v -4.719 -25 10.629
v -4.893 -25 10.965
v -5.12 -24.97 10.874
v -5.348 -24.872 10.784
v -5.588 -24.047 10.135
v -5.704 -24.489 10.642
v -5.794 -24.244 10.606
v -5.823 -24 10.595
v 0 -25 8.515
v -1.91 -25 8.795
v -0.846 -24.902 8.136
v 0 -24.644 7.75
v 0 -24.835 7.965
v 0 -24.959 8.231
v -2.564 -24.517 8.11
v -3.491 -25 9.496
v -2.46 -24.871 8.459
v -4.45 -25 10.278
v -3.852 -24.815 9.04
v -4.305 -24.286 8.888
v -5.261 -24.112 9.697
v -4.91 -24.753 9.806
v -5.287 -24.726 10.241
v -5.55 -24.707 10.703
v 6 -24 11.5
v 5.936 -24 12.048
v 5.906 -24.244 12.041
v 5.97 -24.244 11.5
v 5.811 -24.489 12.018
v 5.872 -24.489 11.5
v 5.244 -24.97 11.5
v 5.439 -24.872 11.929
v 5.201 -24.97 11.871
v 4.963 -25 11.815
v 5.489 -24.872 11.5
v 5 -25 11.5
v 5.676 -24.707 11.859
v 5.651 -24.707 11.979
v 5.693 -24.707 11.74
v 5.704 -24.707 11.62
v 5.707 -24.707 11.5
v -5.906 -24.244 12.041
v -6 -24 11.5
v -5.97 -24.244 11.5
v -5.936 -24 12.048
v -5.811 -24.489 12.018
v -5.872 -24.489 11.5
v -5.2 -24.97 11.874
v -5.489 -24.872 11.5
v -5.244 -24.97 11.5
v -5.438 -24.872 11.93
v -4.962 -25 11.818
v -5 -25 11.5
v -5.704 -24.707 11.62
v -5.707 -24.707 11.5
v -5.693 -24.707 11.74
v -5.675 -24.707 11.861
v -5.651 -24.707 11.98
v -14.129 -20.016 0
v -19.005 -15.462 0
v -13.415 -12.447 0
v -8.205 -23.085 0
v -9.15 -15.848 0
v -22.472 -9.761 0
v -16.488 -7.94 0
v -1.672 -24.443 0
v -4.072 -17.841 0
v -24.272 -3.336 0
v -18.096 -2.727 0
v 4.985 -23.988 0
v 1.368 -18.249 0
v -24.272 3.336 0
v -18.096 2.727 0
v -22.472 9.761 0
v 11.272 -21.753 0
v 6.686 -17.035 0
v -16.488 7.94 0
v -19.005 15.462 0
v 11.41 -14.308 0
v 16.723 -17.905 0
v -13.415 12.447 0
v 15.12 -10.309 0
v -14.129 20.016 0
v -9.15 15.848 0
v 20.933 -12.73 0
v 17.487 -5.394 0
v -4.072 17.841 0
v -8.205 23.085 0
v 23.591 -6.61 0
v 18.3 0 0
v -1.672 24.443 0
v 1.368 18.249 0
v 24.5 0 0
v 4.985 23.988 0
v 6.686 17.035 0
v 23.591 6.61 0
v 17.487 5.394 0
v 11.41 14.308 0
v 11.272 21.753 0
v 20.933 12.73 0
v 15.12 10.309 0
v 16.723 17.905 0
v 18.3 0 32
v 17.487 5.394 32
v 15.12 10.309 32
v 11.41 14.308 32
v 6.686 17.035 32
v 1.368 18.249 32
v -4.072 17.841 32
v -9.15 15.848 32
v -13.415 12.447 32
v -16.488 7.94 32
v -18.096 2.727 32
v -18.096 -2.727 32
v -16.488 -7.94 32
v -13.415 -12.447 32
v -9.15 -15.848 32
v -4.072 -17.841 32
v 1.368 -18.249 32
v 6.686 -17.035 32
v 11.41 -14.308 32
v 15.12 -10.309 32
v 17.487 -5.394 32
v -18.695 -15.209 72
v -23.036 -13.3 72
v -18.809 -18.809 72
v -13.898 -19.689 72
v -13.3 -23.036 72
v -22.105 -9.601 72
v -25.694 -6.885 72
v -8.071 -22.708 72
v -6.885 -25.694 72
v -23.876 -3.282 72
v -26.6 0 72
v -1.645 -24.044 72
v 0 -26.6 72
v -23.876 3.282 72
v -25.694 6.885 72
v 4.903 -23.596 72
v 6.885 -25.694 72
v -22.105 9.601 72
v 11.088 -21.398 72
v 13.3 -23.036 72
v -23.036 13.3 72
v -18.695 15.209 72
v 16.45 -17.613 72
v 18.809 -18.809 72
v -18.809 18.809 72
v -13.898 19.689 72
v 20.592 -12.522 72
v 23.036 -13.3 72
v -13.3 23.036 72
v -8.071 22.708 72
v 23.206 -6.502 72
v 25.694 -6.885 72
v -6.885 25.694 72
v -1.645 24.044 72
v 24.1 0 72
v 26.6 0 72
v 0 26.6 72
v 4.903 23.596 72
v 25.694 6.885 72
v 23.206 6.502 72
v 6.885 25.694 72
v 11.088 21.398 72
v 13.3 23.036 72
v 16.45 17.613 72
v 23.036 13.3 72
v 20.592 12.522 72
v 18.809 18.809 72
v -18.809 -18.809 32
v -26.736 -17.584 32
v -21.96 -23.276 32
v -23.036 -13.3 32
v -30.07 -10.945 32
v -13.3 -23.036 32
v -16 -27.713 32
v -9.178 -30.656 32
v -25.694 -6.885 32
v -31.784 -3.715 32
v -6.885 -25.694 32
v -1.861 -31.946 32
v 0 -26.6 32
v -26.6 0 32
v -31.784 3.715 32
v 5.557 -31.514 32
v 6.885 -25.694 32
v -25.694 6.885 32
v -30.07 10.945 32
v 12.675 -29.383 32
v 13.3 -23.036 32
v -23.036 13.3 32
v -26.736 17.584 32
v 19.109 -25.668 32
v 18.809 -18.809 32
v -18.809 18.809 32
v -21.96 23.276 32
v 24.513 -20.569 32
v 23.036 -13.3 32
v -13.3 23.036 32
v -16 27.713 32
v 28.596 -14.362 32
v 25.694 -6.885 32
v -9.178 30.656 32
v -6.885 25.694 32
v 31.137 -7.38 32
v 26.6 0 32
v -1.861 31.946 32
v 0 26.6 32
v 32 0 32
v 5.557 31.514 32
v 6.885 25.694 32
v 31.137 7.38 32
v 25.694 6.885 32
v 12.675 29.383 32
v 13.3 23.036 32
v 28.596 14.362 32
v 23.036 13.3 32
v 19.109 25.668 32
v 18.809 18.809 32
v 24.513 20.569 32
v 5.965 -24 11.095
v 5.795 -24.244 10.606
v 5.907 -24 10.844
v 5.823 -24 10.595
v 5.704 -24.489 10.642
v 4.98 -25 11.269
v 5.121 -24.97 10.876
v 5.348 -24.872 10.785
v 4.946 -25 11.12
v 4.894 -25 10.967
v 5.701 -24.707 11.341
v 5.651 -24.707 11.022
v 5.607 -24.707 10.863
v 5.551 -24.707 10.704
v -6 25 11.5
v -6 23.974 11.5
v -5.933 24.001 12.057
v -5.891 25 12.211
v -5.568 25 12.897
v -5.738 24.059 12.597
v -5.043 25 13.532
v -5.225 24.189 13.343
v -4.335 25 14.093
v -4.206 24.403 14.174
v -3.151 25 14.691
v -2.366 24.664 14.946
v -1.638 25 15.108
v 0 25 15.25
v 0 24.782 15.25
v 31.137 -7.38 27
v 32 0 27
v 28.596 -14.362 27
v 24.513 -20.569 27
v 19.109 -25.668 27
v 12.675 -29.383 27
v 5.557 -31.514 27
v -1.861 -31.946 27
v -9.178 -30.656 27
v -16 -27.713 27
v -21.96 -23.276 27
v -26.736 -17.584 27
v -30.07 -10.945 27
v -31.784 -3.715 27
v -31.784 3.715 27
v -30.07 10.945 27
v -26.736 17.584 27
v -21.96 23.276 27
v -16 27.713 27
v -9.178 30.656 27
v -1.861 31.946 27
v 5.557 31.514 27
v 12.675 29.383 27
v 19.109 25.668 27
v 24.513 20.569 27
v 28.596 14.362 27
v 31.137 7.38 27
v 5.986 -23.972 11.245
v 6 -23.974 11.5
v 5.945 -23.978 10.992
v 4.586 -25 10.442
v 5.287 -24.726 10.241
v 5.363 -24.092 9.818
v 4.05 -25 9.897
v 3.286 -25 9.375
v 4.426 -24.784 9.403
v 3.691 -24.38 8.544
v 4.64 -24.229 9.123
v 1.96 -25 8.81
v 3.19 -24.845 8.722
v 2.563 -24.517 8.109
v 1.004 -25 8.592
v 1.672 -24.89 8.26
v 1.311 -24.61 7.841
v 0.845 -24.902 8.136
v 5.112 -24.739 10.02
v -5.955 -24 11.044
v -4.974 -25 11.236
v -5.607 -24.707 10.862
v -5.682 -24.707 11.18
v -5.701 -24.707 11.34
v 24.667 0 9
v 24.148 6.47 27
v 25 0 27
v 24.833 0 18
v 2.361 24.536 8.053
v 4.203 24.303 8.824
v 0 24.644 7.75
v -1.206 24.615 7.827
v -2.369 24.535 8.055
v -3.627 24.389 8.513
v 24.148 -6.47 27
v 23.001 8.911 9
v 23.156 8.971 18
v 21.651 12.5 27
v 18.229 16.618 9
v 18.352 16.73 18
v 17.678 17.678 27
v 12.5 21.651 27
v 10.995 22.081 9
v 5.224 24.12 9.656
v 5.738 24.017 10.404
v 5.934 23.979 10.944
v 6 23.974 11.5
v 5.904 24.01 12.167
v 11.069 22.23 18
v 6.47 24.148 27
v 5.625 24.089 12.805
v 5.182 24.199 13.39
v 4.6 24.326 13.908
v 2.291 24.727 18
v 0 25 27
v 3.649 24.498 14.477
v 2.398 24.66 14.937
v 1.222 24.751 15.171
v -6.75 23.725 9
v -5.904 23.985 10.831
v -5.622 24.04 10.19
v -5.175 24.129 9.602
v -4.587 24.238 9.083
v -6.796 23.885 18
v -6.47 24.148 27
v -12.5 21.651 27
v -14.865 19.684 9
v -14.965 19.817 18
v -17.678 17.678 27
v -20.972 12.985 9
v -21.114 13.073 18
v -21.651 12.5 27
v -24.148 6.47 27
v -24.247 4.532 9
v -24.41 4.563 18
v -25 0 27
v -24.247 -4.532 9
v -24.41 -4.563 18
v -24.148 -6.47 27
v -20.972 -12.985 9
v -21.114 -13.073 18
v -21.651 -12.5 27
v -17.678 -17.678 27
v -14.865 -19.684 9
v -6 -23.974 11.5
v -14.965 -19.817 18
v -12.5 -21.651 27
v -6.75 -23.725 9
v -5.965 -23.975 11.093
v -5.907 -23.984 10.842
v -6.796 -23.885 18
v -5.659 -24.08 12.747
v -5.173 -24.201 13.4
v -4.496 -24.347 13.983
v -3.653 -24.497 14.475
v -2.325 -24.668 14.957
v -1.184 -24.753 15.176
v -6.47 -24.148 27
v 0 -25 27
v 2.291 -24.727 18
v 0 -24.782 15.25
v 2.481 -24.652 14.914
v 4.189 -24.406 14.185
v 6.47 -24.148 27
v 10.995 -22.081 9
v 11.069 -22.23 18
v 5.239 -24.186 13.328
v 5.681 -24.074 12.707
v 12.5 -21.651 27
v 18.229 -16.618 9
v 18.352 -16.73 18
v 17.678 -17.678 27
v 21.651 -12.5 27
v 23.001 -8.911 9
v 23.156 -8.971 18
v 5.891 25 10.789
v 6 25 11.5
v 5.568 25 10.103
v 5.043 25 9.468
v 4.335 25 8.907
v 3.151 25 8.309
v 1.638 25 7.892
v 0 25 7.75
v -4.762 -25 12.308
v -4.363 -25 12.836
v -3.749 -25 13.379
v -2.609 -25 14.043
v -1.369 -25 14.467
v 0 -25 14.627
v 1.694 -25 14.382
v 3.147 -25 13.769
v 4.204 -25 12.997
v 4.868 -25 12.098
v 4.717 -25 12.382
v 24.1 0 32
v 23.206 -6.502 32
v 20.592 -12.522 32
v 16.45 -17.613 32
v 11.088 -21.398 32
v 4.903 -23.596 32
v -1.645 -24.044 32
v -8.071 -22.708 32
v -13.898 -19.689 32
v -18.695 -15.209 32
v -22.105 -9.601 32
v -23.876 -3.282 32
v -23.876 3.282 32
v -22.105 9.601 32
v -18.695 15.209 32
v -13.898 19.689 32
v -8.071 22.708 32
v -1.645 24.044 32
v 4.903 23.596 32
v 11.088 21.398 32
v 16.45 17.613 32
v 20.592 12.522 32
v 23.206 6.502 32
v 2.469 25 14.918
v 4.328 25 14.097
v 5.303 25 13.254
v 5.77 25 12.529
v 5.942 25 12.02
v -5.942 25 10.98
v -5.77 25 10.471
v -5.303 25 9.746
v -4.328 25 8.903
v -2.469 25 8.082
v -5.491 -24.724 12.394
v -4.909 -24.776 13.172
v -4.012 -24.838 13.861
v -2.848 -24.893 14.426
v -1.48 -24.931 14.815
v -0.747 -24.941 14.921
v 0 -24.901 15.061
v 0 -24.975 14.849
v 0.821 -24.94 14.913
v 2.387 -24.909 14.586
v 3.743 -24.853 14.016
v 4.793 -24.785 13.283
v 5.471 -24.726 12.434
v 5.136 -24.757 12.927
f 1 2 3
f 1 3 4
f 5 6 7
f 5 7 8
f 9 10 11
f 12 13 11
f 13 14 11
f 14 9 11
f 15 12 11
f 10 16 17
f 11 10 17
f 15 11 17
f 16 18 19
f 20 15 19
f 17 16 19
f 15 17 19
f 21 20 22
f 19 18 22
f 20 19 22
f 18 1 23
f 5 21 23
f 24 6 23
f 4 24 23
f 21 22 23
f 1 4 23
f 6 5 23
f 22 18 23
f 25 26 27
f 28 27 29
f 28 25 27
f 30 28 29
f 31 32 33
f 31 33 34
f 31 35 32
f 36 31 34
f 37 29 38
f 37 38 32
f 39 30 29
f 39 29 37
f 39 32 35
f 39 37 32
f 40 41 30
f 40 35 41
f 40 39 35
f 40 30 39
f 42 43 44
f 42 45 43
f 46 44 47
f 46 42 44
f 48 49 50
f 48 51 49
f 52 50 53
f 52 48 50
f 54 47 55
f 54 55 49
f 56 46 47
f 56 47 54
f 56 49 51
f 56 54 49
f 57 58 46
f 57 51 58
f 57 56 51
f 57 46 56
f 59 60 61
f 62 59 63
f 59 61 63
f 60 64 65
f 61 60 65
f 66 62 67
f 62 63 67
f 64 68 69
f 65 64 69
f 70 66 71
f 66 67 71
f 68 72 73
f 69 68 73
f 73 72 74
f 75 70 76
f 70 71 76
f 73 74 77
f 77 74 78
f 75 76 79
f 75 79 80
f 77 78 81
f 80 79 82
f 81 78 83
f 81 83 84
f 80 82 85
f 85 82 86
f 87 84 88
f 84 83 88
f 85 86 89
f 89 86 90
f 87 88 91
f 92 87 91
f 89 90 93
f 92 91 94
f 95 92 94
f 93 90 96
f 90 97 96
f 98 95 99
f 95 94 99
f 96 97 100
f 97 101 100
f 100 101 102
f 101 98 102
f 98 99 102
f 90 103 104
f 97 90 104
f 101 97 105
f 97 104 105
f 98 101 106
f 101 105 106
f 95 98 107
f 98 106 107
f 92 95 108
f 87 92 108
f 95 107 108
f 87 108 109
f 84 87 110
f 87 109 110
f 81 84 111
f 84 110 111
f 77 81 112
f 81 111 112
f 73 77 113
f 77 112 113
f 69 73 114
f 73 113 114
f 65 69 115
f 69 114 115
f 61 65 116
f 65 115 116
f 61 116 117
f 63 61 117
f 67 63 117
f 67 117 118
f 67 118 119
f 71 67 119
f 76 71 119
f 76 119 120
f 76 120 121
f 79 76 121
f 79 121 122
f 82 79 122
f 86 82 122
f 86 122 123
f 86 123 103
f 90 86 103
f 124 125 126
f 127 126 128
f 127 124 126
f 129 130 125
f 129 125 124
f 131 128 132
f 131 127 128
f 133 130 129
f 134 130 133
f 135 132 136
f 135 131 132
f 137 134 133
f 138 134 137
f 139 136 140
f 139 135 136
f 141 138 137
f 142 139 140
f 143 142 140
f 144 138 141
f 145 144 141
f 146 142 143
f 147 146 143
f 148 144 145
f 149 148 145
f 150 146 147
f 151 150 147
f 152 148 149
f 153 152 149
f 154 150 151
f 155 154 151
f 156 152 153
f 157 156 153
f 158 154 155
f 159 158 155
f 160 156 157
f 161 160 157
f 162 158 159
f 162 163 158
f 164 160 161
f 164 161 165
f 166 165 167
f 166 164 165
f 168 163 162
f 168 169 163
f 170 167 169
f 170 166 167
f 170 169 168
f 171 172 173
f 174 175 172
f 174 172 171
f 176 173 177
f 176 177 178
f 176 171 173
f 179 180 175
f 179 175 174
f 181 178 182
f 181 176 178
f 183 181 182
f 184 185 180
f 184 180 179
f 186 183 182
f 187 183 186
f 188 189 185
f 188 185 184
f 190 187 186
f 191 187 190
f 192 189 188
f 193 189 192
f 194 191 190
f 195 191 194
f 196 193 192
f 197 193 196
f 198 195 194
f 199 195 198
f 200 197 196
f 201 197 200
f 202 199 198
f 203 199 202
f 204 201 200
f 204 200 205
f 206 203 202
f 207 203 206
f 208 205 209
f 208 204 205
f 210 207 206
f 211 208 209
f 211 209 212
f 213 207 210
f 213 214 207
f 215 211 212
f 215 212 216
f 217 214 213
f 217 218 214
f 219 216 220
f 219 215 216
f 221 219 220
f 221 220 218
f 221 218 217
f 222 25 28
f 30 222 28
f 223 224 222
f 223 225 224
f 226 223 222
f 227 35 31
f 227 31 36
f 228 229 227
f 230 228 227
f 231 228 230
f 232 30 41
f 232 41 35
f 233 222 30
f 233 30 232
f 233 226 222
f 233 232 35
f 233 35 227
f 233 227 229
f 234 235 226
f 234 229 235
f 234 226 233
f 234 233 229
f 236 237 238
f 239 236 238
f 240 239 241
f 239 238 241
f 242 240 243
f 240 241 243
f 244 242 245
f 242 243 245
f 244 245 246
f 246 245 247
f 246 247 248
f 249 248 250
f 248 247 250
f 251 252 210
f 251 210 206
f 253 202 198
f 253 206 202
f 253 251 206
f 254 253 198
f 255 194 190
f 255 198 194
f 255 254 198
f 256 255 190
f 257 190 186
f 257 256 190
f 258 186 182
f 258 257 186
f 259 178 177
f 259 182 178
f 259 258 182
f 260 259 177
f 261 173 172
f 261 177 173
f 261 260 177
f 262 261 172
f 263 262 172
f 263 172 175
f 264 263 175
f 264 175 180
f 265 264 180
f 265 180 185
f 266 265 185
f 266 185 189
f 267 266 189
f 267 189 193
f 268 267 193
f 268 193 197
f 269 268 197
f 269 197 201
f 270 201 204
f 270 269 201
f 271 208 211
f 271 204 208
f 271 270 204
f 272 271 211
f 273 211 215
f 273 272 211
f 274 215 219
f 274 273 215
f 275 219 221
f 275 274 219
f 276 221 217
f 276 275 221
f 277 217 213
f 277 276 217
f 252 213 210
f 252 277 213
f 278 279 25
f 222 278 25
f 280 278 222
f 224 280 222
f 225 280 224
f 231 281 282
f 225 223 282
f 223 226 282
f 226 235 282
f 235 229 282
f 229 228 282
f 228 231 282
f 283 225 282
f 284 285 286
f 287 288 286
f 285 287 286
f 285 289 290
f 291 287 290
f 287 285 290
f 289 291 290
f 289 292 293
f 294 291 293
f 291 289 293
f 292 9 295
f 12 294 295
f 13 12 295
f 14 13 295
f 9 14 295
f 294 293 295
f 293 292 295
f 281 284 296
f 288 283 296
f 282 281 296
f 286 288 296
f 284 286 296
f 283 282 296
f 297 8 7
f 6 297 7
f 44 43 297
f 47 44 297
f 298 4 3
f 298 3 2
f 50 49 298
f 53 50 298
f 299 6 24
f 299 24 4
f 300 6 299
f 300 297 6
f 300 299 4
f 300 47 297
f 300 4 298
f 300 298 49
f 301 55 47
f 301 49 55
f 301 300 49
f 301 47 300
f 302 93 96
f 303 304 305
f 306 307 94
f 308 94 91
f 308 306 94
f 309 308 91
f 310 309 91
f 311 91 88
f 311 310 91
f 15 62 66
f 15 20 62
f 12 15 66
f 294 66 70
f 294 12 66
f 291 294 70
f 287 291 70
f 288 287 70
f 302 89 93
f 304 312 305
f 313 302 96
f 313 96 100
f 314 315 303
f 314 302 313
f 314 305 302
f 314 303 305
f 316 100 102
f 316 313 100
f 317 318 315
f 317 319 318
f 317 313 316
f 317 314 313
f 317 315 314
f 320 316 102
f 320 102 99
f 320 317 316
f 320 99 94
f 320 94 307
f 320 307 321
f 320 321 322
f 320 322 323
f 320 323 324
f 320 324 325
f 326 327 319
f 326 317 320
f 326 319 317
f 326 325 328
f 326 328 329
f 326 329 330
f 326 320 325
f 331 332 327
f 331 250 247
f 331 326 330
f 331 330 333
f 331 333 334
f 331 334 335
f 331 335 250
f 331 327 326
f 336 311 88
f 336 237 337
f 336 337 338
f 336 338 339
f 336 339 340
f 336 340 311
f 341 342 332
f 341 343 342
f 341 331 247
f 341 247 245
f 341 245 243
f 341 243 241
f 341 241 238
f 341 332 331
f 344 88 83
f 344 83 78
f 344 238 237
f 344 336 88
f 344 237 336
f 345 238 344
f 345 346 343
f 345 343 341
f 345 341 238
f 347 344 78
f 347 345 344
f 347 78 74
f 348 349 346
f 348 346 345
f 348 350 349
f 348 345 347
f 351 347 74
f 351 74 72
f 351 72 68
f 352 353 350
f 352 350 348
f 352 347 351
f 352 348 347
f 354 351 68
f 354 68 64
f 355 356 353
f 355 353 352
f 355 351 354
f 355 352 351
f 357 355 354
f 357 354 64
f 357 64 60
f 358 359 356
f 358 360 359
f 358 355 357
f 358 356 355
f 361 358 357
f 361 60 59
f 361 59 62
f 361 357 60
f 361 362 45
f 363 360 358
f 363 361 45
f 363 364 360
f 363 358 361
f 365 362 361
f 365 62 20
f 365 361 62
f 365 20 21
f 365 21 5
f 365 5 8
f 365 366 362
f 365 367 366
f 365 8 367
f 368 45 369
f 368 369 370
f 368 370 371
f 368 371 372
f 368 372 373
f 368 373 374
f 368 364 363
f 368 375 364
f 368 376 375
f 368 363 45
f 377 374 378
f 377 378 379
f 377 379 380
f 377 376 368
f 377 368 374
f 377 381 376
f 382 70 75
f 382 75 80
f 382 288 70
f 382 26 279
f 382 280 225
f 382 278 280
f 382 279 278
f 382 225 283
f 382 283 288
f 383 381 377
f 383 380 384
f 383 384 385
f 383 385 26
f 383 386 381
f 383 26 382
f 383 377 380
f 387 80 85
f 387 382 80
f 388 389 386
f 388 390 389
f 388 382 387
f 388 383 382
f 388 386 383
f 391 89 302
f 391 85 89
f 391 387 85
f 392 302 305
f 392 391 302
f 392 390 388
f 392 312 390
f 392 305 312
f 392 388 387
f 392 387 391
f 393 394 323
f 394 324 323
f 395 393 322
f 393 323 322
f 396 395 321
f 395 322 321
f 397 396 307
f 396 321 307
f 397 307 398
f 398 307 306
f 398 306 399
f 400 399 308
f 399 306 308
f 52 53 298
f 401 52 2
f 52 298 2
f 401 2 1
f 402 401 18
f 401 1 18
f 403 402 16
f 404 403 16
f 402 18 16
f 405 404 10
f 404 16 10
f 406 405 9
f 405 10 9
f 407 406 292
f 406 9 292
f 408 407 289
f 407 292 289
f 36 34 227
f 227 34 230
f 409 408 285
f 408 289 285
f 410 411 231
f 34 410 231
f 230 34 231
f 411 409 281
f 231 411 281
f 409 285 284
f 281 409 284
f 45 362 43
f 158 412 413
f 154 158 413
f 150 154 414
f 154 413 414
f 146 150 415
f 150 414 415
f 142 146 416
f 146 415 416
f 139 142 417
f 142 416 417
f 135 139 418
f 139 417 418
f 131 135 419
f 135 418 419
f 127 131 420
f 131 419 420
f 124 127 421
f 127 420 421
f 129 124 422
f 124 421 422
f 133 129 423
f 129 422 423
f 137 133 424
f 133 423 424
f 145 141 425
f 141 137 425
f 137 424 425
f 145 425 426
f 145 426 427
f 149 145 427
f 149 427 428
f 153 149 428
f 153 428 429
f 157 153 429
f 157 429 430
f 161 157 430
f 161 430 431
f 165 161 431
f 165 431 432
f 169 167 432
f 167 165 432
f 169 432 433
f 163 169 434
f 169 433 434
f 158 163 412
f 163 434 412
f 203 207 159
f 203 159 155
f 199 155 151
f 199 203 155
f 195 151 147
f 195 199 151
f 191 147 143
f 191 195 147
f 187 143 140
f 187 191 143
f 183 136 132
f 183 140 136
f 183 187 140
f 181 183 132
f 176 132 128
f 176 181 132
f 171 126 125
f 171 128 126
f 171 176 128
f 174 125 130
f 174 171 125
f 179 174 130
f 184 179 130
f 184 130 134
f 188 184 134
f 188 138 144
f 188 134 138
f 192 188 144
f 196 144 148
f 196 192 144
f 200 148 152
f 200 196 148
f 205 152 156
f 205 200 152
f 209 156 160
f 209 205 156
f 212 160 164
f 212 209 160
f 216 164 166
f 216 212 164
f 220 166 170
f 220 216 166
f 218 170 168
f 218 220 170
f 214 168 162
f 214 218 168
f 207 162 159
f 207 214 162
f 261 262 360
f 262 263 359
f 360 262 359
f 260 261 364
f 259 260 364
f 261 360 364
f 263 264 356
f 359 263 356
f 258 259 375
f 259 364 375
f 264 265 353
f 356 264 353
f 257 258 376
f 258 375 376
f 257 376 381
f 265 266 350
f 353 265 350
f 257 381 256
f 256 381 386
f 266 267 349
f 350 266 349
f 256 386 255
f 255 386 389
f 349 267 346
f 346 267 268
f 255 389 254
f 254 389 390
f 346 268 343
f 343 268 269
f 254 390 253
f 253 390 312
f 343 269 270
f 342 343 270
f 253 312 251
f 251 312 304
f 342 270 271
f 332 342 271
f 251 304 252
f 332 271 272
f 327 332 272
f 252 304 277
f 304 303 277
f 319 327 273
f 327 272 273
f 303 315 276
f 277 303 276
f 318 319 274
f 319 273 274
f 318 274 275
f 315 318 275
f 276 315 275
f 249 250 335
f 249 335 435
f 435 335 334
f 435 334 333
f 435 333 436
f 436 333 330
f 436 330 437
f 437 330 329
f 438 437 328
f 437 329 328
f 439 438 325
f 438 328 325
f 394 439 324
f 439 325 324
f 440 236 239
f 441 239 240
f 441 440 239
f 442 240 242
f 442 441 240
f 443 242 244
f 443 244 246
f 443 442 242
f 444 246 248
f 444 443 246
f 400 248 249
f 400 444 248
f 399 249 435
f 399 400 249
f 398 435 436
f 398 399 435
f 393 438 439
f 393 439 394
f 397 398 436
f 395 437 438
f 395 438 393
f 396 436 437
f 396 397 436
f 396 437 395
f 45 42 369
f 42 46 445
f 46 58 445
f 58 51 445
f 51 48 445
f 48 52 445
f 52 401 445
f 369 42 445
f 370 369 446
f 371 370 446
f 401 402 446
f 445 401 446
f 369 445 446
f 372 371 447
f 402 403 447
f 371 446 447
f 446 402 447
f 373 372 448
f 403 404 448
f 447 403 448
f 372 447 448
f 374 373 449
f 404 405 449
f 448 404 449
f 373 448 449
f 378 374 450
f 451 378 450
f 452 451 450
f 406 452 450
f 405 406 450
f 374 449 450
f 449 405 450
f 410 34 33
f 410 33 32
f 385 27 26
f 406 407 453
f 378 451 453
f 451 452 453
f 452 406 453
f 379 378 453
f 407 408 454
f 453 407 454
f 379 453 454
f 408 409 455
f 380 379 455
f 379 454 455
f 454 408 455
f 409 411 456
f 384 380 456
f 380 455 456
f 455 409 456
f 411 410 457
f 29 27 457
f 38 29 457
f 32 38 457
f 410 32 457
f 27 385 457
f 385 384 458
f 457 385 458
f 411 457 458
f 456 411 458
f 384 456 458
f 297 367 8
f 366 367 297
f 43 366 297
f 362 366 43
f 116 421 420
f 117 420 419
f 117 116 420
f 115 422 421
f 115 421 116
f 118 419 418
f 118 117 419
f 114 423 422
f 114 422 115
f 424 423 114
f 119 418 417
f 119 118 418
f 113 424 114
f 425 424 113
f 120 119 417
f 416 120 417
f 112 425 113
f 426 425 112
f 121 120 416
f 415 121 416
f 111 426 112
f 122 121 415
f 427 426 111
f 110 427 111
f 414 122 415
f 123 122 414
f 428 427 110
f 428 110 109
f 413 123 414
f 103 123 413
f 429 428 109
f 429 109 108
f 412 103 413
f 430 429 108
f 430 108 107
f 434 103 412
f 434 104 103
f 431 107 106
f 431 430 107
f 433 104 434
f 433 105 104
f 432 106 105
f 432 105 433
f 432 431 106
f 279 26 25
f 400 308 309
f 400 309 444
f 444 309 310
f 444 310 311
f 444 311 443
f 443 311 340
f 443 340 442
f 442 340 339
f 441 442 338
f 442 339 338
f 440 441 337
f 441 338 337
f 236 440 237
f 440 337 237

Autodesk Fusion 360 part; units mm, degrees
sketch "Sketch1" plane through (0, 0, 0) normal (0, 0, 1) x (1, 0, 0)
  circle A0 centre (0, 0) radius 24.5
  circle A1 centre (0, 0) radius 18.3
  dimension "d1" = 49
  dimension "d7" = 36.6
ref_plane "WorkPlane1" through (0, 0, 27) normal (0, 0, 1) x (1, 0, 0)
sketch "Sketch2" plane through (0, 0, 27) normal (0, 0, 1) x (1, 0, 0)
  circle A0 centre (0, 0) radius 25
  circle A1 centre (0, 0) radius 18.3
  dimension "d6" = 50
  dimension "d8" = 36.6
loft "Loft3" add profiles "Sketch1", "Sketch2" section 1 section 2
loft "Loft4" cut profiles "Sketch1", "Sketch2" section 1 contours A1 section 2 contours A1
sketch "Sketch3" plane through (0, 0, 27) normal (0, 0, 1) x (1, 0, 0)
  circle A0 centre (0, 0) radius 32
  circle A1 centre (0, 0) radius 26.6
  circle A2 centre (0, 0) radius 24.1
  dimension "d9" = 64
  dimension "d10" = 53.2
  dimension "d15" = 48.2
extrude "Extrude1" add sketch "Sketch2" sketch "Sketch3" along normal blind 5 of sketch 2 contours A0 | A1
extrude "Extrude2" add sketch "Sketch3" along normal blind 45 contours A1
sketch "Sketch5" plane through (0, 0, 0) normal (0, 1, 0) x (1, 0, 0)
  ellipse E0 centre (0, -11.5) end of major axis (6, -11.5) minor radius 3.75
  line L0 (-6, -11.5) -> (6, -11.5)
  line L1 (0, -15.25) -> (0, -7.75)
  line L2 (-32, -27) -> (32, -27)
  dimension "d20" = 12
  dimension "d21" = 7.5
  dimension "d23" = 15.5
extrude "Extrude4" add sketch "Sketch5" along normal blind 2 from surface at 23
extrude "Extrude5" add sketch "Sketch5" against normal blind 2 from surface at -23
fillet "Fillet1" radius 1 2 edges at (-6, 25, 11.5) (-6, -25, 11.5)
